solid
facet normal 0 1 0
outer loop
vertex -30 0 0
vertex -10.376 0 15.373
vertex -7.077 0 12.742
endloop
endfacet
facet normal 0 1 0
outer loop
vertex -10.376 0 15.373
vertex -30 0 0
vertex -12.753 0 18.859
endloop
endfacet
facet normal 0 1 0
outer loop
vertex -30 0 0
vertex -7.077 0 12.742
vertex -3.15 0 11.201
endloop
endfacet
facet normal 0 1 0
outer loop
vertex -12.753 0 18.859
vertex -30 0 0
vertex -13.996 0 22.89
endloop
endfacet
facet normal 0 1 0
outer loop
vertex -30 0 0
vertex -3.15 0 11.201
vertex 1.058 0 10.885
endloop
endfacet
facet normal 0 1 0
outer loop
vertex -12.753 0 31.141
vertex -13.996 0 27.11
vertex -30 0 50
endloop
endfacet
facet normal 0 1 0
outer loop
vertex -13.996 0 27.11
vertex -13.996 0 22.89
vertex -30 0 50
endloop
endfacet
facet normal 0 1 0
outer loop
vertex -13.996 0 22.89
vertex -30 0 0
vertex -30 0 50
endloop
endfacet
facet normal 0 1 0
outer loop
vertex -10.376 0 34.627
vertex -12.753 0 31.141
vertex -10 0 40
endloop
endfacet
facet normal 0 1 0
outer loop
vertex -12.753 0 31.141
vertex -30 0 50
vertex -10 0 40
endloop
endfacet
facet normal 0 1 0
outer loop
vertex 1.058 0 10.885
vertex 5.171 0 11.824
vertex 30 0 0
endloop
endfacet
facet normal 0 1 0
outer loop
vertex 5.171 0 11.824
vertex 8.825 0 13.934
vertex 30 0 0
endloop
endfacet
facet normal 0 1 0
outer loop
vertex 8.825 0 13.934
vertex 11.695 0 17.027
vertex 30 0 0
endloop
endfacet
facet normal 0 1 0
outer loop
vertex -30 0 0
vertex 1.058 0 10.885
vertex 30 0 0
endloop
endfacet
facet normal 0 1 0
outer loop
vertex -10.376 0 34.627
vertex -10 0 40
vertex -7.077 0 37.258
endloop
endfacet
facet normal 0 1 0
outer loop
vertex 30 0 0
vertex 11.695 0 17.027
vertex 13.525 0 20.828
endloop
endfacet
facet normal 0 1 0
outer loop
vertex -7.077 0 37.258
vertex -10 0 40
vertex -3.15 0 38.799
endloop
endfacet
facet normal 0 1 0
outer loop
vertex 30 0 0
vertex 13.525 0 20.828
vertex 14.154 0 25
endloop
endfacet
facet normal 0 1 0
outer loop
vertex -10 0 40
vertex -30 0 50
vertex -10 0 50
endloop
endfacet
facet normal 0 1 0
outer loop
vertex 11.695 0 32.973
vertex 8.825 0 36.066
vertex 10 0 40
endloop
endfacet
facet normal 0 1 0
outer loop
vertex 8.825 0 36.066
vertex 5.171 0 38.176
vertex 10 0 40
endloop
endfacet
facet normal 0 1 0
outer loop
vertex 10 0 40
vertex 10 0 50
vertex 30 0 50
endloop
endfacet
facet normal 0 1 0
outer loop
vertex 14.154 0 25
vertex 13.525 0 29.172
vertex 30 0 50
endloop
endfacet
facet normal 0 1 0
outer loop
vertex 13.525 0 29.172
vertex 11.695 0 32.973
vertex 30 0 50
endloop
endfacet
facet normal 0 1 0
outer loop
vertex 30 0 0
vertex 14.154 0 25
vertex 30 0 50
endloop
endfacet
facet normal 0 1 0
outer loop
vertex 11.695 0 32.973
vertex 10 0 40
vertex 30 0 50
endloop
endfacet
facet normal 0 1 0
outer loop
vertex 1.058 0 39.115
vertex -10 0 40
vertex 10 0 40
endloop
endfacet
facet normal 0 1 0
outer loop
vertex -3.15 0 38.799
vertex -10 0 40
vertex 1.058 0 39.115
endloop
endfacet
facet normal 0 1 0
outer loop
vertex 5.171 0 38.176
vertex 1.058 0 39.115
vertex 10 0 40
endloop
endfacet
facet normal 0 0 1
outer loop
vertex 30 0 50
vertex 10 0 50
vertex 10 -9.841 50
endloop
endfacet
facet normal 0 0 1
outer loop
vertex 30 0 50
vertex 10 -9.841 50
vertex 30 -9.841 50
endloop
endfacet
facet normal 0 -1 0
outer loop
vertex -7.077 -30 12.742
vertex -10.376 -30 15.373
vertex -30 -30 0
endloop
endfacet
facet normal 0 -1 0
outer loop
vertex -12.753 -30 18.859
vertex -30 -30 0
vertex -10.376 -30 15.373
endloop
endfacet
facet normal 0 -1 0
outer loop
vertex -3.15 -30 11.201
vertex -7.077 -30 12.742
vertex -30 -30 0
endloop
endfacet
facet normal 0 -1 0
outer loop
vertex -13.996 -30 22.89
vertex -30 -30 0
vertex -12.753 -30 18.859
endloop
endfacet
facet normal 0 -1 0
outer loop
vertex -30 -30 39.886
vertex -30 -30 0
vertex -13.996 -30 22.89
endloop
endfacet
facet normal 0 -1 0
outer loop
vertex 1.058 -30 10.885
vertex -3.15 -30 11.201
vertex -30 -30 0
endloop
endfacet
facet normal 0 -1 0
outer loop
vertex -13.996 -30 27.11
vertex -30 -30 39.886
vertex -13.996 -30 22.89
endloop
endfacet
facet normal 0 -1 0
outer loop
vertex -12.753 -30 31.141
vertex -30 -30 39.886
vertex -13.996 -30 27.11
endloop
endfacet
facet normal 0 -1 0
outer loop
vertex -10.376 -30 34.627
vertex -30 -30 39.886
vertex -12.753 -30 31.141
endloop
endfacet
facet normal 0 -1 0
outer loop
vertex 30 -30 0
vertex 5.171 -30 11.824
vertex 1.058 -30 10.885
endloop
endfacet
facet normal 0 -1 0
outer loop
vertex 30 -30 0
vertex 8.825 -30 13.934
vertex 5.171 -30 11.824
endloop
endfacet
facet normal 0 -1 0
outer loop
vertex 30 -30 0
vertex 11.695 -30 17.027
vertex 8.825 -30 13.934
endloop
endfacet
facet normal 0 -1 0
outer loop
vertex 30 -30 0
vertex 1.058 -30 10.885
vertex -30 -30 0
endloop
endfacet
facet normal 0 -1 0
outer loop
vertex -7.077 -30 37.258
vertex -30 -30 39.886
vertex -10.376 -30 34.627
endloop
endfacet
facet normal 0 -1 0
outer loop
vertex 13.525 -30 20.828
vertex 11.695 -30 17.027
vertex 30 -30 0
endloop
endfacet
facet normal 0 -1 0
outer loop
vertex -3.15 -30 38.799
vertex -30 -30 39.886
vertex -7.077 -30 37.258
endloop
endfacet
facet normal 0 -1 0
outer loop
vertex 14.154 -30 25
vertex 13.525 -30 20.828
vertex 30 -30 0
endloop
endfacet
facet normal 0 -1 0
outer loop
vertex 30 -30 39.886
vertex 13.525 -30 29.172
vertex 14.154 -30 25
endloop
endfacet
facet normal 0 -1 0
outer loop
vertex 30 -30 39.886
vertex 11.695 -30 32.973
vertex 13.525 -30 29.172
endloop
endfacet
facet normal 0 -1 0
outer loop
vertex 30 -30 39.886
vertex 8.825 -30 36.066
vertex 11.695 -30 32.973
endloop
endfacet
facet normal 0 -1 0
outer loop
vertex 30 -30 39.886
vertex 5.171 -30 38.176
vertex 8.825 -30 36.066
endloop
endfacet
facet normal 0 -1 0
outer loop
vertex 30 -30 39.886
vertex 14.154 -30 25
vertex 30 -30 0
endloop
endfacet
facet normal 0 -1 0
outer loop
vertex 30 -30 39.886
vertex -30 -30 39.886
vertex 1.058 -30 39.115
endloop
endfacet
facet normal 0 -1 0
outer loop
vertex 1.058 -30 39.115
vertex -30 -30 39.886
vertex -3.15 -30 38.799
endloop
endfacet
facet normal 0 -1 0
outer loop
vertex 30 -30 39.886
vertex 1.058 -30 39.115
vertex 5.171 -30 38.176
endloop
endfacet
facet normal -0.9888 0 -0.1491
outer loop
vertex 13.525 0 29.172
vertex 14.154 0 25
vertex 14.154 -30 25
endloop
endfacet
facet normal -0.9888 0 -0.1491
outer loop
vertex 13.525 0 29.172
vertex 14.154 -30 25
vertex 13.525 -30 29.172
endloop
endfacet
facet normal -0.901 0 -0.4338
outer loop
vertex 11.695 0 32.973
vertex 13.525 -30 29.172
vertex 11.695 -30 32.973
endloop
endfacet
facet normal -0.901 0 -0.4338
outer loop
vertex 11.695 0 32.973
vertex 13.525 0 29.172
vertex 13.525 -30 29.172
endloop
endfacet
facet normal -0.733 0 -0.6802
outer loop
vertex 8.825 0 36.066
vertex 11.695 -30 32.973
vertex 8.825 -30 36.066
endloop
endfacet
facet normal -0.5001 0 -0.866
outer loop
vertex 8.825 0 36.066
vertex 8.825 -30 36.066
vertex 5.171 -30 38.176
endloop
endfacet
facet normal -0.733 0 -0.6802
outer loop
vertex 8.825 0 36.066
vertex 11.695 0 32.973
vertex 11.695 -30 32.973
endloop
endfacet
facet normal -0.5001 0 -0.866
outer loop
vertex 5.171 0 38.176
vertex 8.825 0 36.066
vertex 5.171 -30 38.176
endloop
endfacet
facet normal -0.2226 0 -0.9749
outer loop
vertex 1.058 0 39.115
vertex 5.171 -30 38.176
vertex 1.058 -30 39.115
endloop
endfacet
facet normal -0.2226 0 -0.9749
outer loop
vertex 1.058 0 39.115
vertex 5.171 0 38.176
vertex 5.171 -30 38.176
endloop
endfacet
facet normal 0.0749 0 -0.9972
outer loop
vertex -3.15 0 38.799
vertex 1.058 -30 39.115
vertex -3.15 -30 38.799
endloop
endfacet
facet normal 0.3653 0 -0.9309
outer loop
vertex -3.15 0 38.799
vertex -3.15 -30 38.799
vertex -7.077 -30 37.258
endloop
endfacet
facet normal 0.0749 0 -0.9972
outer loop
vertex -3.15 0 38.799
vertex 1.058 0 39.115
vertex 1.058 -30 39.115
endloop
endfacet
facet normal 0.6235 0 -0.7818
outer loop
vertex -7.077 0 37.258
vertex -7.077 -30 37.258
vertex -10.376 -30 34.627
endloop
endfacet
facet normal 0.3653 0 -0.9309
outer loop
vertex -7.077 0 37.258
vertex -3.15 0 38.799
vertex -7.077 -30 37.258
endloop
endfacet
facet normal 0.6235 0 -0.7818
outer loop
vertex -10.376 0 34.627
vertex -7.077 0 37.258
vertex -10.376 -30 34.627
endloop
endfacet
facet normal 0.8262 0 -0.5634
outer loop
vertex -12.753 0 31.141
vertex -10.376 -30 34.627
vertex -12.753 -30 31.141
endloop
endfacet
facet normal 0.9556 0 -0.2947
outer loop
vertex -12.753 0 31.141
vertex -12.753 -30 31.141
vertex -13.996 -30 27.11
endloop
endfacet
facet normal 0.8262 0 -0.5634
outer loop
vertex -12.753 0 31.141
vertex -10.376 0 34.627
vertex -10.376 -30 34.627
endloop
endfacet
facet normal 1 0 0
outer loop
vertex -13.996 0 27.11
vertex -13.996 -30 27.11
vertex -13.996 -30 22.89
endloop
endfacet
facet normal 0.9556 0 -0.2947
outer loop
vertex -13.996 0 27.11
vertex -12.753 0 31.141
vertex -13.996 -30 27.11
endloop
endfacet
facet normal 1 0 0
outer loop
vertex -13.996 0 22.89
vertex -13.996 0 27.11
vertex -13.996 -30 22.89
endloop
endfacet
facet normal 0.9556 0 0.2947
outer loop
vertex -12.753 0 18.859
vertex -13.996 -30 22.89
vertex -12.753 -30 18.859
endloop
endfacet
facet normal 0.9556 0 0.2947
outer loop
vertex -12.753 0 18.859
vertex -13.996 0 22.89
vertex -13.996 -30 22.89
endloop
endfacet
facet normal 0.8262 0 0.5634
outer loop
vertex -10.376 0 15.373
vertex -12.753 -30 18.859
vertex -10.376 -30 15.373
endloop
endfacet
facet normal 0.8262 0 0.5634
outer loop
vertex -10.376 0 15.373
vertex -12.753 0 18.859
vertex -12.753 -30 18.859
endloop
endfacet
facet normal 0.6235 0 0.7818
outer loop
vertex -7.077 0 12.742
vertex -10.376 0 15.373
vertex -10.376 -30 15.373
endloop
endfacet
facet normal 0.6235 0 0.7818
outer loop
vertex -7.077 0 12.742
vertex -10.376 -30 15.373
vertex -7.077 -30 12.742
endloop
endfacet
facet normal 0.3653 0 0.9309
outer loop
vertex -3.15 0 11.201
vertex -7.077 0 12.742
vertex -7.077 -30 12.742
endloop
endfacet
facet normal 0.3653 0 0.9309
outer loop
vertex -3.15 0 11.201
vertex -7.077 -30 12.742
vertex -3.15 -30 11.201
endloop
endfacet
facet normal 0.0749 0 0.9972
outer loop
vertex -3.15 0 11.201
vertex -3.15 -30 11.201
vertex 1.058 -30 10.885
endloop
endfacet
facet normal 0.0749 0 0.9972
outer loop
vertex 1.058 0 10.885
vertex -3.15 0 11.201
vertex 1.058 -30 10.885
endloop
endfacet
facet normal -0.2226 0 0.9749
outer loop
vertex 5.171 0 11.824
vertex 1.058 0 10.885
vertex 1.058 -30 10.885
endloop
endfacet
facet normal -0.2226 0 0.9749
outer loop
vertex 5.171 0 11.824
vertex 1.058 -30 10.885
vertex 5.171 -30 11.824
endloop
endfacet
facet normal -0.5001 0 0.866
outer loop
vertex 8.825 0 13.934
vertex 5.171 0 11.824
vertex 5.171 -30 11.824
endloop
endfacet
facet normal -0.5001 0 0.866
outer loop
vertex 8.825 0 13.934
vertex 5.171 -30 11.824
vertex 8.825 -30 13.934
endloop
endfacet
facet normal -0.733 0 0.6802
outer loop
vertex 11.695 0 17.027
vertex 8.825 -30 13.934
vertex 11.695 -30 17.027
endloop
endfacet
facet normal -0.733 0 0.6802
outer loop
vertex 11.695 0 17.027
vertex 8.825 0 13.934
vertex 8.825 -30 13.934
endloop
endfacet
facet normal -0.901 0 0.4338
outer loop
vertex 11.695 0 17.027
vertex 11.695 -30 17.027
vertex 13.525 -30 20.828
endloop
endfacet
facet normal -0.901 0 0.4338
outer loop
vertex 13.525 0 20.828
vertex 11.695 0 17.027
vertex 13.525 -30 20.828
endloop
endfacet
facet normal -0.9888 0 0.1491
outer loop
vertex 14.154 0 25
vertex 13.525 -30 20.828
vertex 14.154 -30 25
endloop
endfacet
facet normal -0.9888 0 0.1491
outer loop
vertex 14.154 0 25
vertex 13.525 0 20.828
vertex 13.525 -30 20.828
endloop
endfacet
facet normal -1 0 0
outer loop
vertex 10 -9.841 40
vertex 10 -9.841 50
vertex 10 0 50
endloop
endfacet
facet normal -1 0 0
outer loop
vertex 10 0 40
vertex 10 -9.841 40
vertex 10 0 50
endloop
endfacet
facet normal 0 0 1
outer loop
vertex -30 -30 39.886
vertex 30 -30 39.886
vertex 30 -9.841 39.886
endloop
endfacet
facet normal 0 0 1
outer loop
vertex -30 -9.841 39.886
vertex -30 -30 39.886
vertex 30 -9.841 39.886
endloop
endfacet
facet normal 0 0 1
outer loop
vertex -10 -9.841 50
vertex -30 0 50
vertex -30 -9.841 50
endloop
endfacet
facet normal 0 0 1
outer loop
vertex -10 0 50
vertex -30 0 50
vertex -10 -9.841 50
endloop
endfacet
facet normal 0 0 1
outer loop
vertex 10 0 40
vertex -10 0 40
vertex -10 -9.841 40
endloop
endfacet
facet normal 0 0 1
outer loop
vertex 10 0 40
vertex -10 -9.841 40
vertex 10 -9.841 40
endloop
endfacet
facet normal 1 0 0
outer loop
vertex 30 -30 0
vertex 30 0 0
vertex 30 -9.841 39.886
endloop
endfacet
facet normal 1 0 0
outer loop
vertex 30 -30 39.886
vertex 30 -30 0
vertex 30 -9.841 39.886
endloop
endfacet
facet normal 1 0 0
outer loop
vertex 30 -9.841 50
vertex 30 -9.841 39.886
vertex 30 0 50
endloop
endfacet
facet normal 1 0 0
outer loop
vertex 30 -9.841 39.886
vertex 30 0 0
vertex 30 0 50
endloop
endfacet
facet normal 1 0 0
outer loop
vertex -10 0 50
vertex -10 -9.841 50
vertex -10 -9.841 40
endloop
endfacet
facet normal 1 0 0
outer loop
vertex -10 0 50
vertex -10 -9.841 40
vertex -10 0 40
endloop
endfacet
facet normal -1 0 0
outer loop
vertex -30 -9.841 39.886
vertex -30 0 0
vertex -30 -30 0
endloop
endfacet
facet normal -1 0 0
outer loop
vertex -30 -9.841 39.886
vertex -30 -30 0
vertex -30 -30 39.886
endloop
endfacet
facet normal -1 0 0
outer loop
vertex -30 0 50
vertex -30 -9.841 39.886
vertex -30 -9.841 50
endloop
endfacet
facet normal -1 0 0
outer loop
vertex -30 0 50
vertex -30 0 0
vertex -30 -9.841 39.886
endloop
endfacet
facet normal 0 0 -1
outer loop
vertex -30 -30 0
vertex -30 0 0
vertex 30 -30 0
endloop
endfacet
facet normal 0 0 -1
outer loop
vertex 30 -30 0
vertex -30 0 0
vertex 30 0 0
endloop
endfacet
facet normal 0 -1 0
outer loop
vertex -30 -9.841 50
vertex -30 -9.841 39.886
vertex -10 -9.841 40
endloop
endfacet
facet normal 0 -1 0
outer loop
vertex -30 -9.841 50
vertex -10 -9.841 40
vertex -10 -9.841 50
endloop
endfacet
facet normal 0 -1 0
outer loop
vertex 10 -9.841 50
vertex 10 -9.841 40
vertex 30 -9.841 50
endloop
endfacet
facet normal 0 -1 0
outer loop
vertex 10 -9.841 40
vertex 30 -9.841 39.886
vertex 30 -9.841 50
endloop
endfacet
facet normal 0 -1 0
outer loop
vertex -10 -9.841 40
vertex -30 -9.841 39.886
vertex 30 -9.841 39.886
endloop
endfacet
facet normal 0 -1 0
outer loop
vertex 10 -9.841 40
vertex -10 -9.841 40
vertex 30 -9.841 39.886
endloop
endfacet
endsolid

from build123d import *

# Parameters (mm, degrees)
F0_W     = 60
F0_H     = 50
F0_R     = 14.1543173952
F1_DEPTH = 30
F2_W     = 20.1585159823
F2_H     = 10.1142704487
F3_DEPTH = 95
F4_W     = 20
F4_H     = 9.8414840177
F5_DEPTH = 10


with BuildPart() as f1:
    # F0 (on Front) → F1 (new body)
    with BuildSketch(Plane.XZ):
        with Locations((0, 25)):
            Rectangle(F0_W, F0_H)
        with Locations((0, 25)):
            Circle(F0_R, mode=Mode.SUBTRACT)
    extrude(amount=F1_DEPTH)

    # F2 (on face) → F3 (cut)
    with BuildSketch(Plane.YZ.offset(30)):
        with Locations((-19.9207420088, 44.9428647757)):
            Rectangle(F2_W, F2_H)
    extrude(amount=-F3_DEPTH, mode=Mode.SUBTRACT)

    # F4 (on face) → F5 (cut)
    with BuildSketch(Plane.XY.offset(50)):
        with Locations((0, -4.9207420088)):
            Rectangle(F4_W, F4_H)
    extrude(amount=-F5_DEPTH, mode=Mode.SUBTRACT)


solid = f1.part
